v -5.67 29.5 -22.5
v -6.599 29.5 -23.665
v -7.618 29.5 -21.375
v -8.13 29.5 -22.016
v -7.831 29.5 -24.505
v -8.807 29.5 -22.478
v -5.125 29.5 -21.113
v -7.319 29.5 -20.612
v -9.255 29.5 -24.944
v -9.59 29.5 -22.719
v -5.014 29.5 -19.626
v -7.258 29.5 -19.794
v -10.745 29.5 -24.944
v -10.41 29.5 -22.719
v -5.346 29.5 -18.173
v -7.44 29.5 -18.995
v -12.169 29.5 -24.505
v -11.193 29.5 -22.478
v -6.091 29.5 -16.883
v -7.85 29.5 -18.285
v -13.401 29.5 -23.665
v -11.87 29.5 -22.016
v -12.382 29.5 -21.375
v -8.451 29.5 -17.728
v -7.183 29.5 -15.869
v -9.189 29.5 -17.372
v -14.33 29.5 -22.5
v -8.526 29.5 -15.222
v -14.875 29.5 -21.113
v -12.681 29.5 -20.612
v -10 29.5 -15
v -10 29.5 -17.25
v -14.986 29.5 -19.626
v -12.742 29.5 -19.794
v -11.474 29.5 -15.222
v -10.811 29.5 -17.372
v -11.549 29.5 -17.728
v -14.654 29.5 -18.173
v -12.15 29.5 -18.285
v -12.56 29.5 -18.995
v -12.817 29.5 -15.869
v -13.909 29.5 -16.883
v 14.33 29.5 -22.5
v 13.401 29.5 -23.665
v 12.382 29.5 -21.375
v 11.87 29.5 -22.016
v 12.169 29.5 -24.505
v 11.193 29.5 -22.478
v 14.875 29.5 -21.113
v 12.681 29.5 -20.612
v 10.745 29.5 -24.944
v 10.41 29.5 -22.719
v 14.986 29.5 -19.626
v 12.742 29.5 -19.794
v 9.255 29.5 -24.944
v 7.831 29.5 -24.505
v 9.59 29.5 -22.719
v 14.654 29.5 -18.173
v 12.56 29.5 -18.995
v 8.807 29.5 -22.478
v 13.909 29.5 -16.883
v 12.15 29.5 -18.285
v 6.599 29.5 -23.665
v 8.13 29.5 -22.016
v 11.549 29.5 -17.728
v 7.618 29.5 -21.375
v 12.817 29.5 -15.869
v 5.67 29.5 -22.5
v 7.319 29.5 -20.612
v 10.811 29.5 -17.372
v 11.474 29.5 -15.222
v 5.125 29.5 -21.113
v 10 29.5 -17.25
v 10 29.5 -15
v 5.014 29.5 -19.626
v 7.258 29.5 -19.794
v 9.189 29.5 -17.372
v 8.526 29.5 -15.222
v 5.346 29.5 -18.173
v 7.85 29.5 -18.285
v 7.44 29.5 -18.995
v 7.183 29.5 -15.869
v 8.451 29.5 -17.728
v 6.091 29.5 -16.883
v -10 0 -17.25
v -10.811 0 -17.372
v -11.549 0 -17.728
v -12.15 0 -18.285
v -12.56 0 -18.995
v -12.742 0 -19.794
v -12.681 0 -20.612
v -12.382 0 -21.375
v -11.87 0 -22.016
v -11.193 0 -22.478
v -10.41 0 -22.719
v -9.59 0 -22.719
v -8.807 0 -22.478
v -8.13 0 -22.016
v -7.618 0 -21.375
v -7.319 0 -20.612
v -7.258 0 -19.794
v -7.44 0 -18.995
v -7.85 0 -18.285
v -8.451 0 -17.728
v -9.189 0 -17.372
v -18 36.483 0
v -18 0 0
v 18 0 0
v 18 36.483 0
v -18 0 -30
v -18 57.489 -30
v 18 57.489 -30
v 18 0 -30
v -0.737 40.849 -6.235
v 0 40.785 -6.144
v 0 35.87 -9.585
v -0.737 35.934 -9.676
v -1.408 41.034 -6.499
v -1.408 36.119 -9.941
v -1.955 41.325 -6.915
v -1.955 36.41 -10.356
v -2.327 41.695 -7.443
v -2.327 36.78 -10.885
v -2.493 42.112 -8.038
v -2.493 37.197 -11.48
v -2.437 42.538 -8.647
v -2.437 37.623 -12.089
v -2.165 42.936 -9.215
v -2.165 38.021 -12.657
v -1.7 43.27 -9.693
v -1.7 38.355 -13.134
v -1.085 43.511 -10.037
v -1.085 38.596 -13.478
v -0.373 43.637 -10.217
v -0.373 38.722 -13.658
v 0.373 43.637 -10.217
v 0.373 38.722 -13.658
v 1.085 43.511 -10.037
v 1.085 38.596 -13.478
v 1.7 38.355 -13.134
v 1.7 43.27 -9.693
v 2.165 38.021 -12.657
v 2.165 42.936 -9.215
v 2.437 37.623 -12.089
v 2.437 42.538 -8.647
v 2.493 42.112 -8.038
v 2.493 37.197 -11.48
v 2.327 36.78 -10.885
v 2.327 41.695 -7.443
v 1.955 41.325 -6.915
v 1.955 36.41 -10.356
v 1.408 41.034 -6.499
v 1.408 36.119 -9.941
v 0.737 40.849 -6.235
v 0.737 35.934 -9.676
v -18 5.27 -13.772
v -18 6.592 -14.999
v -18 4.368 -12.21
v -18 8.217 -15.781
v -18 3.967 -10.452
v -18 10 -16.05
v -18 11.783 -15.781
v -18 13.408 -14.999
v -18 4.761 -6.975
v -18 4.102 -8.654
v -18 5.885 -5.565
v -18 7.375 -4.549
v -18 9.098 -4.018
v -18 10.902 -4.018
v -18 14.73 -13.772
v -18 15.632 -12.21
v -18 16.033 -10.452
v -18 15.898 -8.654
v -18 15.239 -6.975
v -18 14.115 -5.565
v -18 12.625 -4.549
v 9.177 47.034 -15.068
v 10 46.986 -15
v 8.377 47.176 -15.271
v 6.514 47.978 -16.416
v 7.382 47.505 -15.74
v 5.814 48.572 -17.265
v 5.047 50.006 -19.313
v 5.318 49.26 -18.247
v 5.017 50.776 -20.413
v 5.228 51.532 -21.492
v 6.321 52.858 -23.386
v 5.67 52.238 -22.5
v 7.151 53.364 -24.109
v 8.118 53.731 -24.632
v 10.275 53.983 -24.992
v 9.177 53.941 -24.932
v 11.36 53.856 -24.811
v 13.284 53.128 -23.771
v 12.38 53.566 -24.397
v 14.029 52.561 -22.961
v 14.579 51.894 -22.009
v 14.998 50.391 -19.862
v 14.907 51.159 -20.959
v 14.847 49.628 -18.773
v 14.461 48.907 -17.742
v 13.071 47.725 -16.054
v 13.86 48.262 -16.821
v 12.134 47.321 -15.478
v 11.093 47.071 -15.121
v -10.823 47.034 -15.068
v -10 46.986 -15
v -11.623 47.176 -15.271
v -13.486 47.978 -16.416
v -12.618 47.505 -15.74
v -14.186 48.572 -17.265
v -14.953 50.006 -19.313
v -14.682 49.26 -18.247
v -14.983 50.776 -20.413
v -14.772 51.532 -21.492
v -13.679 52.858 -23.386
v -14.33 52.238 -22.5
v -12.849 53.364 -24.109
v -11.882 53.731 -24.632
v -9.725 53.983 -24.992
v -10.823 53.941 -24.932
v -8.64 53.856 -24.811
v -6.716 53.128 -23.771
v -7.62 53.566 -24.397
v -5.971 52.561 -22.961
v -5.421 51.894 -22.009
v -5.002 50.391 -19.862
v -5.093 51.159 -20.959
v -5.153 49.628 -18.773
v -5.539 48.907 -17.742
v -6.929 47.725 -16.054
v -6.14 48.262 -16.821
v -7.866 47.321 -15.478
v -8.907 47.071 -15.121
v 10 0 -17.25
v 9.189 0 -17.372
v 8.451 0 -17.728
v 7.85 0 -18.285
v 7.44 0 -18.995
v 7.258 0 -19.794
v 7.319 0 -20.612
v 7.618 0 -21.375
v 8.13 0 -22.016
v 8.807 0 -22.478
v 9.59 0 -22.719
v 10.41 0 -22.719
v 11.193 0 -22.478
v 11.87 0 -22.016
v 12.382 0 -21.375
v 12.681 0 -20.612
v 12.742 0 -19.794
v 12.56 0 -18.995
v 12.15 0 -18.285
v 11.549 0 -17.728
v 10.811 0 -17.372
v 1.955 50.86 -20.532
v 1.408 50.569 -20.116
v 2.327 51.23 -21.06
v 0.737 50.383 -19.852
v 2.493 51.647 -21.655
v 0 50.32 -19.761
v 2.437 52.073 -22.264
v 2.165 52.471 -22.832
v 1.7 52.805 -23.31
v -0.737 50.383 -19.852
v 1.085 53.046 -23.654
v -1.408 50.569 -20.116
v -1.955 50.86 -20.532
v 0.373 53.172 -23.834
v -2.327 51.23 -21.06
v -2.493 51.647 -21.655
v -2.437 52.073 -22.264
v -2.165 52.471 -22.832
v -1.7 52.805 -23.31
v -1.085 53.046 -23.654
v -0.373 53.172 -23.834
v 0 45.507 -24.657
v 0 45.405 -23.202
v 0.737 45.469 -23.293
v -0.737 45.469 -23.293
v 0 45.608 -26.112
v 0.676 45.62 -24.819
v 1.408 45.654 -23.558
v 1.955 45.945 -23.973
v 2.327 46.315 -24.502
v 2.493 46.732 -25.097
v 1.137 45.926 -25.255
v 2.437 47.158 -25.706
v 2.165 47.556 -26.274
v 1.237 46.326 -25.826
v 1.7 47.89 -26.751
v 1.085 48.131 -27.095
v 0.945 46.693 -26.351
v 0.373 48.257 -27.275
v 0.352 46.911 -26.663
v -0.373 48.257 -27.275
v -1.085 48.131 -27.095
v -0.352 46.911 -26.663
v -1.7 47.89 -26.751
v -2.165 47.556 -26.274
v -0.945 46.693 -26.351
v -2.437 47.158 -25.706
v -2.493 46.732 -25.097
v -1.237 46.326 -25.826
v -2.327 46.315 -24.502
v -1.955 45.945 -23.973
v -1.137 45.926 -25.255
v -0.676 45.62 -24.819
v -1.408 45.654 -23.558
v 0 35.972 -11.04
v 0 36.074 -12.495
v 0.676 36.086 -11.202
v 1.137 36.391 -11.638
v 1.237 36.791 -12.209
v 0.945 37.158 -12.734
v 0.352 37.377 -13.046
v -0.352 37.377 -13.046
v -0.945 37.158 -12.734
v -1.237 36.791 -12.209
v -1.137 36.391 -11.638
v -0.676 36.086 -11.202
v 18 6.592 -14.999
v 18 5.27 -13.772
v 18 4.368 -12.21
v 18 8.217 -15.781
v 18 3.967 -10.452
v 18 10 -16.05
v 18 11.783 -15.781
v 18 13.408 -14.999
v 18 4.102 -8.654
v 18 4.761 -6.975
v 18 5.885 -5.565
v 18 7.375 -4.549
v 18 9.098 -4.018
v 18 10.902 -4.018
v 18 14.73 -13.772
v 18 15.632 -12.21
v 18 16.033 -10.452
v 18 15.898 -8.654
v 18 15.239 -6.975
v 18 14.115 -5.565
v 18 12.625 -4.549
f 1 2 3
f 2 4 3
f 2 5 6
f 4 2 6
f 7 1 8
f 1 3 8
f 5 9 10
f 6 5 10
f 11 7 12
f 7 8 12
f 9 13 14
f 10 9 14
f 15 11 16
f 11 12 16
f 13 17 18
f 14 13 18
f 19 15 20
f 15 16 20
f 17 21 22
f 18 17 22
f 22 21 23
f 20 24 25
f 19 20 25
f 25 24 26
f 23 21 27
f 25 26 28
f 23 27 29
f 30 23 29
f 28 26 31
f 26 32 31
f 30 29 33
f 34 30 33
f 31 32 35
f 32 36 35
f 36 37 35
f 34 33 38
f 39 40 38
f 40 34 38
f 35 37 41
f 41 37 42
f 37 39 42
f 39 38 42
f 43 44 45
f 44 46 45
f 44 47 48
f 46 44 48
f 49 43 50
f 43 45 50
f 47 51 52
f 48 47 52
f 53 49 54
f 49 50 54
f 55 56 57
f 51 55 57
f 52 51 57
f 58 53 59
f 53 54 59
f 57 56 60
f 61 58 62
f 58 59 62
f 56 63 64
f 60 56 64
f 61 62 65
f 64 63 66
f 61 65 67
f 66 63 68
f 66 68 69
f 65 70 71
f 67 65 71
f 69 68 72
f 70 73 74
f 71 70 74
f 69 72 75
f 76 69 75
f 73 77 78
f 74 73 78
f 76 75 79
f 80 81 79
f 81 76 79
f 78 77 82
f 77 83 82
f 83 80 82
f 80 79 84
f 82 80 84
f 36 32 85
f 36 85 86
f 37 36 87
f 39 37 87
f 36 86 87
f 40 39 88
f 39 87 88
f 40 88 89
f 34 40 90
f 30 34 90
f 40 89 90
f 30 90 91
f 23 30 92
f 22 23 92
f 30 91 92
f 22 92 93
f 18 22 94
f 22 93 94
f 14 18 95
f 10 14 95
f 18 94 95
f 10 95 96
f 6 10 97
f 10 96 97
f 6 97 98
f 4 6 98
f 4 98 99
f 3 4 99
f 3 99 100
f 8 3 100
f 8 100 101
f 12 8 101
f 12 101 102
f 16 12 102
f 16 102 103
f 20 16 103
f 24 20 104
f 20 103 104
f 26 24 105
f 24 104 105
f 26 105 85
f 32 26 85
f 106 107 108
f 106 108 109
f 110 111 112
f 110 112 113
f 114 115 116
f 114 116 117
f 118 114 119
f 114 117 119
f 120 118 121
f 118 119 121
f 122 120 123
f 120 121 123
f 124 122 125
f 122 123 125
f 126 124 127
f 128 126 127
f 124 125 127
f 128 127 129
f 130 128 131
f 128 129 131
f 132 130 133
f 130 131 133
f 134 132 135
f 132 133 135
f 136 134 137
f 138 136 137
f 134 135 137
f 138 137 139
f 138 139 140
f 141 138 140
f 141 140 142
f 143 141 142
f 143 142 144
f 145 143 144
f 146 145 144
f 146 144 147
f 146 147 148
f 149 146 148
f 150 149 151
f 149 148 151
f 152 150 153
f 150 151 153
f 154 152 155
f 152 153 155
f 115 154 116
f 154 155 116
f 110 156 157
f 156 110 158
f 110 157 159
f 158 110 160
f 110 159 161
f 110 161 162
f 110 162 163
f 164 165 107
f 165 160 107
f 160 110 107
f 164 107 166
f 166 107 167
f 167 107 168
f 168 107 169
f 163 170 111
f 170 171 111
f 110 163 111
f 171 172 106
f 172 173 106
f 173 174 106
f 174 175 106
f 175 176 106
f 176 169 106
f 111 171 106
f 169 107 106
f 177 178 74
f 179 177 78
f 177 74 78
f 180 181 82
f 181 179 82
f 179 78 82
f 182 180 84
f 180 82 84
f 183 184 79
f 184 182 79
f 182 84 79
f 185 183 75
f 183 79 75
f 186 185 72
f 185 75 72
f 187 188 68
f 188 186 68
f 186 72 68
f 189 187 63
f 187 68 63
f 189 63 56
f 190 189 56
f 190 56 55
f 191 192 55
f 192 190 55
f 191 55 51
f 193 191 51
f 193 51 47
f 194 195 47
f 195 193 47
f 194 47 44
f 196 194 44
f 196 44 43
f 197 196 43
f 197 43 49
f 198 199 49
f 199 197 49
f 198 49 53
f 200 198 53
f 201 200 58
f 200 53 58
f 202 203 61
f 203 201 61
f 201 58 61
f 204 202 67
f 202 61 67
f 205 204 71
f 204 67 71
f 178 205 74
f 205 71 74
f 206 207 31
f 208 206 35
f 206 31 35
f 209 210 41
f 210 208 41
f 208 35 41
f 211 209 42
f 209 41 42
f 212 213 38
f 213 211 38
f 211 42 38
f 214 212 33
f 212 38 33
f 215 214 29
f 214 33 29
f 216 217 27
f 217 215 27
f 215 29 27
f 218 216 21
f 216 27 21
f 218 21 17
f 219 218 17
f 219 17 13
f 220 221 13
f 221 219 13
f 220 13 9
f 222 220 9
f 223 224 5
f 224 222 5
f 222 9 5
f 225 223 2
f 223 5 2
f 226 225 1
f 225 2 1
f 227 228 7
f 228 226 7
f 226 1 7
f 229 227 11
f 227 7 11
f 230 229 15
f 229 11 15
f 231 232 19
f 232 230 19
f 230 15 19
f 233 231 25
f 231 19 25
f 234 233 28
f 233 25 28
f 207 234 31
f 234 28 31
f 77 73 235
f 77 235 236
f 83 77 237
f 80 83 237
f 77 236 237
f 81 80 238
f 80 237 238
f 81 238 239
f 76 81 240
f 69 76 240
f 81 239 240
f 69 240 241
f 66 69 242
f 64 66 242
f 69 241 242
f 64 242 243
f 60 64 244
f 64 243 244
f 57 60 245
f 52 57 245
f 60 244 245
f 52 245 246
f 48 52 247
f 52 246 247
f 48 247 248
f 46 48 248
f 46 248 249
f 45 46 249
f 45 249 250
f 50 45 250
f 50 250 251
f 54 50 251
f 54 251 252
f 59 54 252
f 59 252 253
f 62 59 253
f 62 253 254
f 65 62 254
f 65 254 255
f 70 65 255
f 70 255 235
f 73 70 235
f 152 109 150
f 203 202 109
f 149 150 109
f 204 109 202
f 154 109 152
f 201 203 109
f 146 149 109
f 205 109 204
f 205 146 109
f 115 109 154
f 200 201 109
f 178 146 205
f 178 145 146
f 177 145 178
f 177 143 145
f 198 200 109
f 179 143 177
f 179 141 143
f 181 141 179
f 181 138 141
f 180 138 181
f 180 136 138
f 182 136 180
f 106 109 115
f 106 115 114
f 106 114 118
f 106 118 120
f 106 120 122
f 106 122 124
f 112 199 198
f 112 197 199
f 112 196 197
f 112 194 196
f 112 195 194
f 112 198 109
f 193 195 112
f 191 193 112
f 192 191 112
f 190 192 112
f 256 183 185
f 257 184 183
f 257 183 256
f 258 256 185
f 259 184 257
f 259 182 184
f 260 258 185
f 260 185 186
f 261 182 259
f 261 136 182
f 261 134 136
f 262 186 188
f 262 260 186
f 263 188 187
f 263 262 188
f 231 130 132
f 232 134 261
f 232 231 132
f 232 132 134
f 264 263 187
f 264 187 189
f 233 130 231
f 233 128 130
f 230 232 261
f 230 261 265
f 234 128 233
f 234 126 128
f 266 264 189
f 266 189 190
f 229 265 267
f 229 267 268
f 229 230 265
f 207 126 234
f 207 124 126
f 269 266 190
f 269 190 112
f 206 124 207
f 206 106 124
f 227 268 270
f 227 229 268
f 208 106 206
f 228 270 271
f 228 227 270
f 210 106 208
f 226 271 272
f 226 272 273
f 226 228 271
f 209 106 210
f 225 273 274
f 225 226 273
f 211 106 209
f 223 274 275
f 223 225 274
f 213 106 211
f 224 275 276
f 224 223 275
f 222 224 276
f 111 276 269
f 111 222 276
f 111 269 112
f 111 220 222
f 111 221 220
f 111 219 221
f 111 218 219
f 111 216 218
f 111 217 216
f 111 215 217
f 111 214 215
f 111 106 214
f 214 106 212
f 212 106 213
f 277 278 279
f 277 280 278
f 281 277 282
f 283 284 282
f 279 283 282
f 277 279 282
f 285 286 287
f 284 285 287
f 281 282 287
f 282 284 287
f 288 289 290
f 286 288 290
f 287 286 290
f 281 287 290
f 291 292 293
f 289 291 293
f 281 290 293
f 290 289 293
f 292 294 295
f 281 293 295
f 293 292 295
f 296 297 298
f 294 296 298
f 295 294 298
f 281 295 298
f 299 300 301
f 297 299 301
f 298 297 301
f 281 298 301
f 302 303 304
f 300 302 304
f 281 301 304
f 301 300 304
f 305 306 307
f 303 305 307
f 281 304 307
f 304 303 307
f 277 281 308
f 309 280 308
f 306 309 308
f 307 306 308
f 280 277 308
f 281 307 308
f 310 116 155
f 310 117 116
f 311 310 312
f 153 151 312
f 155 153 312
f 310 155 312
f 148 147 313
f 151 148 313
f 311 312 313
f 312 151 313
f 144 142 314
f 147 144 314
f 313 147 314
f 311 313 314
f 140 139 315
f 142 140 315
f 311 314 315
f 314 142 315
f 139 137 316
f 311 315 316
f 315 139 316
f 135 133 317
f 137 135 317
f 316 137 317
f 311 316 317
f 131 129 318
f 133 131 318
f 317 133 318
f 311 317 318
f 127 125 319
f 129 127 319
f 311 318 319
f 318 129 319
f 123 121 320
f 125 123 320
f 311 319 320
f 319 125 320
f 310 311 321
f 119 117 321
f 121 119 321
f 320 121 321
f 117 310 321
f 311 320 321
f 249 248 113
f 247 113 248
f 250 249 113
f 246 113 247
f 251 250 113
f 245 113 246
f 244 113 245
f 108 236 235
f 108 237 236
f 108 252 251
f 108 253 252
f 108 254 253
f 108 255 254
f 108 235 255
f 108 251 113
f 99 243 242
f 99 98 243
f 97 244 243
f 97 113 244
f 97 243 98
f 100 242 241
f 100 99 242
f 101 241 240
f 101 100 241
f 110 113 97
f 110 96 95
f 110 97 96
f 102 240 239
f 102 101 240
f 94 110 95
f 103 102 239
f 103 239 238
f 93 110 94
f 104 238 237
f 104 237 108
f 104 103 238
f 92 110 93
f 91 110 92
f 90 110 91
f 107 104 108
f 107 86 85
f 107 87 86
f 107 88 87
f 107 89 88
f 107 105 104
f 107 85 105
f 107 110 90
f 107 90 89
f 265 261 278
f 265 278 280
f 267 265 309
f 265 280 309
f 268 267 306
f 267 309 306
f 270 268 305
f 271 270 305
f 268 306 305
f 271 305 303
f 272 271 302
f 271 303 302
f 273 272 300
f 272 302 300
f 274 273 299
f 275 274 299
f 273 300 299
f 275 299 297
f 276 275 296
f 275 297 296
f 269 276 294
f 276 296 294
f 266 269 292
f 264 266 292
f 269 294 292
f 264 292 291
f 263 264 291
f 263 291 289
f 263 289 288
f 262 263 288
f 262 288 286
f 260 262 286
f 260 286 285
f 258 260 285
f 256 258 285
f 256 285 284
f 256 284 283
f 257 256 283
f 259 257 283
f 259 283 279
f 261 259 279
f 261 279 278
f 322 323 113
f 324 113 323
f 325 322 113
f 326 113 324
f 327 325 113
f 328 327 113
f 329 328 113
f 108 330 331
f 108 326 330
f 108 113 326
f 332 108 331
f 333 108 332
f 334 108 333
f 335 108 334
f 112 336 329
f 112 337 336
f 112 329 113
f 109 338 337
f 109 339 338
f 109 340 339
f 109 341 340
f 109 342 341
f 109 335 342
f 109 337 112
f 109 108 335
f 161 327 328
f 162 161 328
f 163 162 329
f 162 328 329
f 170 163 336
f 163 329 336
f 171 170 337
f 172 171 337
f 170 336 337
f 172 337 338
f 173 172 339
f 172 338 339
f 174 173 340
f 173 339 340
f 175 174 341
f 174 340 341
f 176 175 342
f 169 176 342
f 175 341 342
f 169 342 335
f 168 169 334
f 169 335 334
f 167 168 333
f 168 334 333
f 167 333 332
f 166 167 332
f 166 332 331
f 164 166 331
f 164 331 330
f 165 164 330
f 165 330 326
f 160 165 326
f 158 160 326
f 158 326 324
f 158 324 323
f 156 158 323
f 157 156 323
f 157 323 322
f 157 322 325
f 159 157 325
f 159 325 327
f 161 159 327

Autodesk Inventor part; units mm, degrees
ref_plane "YZ Plane" through (0, 0, 0) normal (1, 0, 0) x (0, 1, 0)
ref_plane "XZ Plane" through (0, 0, 0) normal (0, 1, 0) x (-1, 0, 0)
sketch "スケッチ1" plane through (0, 0, 0) normal (1, 0, 0) x (0, 1, 0)
  line L0 (0, 0) -> (36.4832, 0)
  line L1 (36.4832, 0) -> (57.4894, -30)
  line L2 (57.4894, -30) -> (0, -30)
  line L3 (0, -30) -> (0, 0)
  dimension "d0" = 35
  dimension "d1" = 36.4832
  dimension "d2" = 30
extrude "押し出し1" add sketch "スケッチ1" along normal mid plane 36
ref_plane "作業平面1" through (-18, 70, -30) normal (0, -1, 0) x (1, 0, 0)
sketch "スケッチ3" plane through (-18, 70, -30) normal (0, -1, 0) x (1, 0, 0)
  line L0 (0, 0) -> (36, 0) projected
  line L1 (0, 30) -> (0, 0) projected
  line L2 (36, 0) -> (36, 30) projected
  point P0 (18, 30)
  point P1 (8, 10)
  point P2 (28, 10)
  dimension "d11" = 10
  dimension "d12" = 8
  dimension "d13" = 8
  dimension "d14" = 10
hole "穴1" at (-10, 70, -20) at (10, 70, -20) direction (0, -1, 0) diameter 5.5 end through all counterbore diameter 10 counterbore depth 40.5 clearance for "Socket Head Cap Screw" size "M5" standard "Ansi Metric M Profile"
sketch "スケッチ4" plane through (-18, 36.4832, 0) normal (0, 0.8192, 0.5736) x (1, 0, 0)
  line L0 (18, 10) -> (18, 10)
  line L1 (18, 10) -> (18, 26.6232)
  line L2 (18, 26.6232) -> (18, 26.6232)
  line L3 (18, 26.6232) -> (18, 10)
  line L4 (0, 36.6232) -> (36, 36.6232) projected
  line L5 (0, 0) -> (36, 0) projected
  line L6 (0, 0) -> (0, 36.6232) projected
  line L7 (36, 36.6232) -> (36, 0) projected
  point P0 (18, -20.9259)
  dimension "d22" = 36.6232
  dimension "d24" = 10
  dimension "d36" = 10
  dimension "d46" = 18
  dimension "d47" = 18
  dimension "d51" = 36
hole "穴2" at (0, 51.7537, -21.8085) at (0, 42.219, -8.1915) at (0, 51.7537, -21.8085) at (0, 42.219, -8.1915) direction (0, -0.8192, -0.5736) diameter 5 depth 6 tip angle 118
sketch "スケッチ5" plane through (18, 0, 0) normal (1, 0, 0) x (0, 0, -1)
  circle A0 centre (10, 10) radius 6.05
  line L0 (0, 0) -> (30, 0) projected
  line L1 (0, 36.4832) -> (0, 0) projected
  dimension "d40" = 10
  dimension "d41" = 10
  dimension "d42" = 12.1
extrude "押し出し3" cut sketch "スケッチ5" against normal through all
equation "\"d13\" = d12"
equation "\"d14\" = d11"
equation "\"d46\" = 0.5 * d51"
equation "\"d47\" = d46"
properties part number "s_base1"
